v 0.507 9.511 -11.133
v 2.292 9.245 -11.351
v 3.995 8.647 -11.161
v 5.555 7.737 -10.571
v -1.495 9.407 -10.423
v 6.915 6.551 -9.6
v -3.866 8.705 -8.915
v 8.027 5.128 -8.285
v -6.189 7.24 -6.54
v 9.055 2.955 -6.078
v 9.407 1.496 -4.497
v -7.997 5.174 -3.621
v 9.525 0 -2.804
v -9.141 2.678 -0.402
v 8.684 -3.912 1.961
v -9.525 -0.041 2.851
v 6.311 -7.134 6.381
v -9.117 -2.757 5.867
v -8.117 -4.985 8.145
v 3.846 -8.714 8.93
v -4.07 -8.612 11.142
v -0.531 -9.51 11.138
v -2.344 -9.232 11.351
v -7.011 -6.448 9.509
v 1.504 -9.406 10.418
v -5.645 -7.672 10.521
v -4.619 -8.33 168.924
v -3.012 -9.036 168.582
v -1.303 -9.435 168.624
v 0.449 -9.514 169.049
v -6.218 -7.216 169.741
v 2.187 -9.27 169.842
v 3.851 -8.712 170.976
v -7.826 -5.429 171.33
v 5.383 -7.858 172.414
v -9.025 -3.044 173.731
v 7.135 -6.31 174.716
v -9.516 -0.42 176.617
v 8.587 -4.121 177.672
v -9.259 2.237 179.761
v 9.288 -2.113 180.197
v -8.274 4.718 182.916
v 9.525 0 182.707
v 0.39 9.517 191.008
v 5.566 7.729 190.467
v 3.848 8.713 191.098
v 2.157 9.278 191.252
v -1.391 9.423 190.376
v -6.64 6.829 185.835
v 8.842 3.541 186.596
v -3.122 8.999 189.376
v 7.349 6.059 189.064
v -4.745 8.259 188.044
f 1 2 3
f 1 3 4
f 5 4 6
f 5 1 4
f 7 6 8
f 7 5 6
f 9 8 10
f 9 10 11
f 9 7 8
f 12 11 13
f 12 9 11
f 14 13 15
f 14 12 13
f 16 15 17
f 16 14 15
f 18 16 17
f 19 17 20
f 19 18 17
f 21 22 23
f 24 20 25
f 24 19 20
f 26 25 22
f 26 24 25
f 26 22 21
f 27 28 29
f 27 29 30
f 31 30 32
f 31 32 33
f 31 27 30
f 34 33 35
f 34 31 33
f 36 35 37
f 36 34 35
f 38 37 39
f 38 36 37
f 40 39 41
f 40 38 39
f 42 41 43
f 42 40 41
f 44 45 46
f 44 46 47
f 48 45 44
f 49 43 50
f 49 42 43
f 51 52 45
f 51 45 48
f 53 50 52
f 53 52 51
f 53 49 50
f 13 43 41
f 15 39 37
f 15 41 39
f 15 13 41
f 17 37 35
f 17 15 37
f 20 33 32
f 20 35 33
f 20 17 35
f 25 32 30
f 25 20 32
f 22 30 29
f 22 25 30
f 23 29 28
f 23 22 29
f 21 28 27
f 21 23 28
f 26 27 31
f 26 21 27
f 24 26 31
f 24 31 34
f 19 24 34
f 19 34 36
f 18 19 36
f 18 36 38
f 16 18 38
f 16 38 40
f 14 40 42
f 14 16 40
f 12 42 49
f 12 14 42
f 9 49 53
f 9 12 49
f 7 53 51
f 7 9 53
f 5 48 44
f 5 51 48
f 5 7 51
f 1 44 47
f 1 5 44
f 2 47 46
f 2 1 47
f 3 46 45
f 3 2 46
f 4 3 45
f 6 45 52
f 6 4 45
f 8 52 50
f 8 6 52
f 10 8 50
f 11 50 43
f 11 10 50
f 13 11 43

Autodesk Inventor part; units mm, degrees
ref_plane "Start Plane" through (0, 0, -13.8034) normal (0, 0, 1) x (1, 0, 0)
ref_plane "End Plane" through (0, 0, 193.7064) normal (0, 0, 1) x (1, 0, 0)
sketch "Sketch" plane through (0, 0, 0) normal (0, 0, 1) x (1, 0, 0)
  circle A0 centre (0, 0) radius 9.525
  dimension "d0" = 19.05
extrude "Body" add sketch "Sketch" along normal up to surface (207.5098 mm away) from surface at -13.8034
sketch "Sketch2" plane through (0, 0, 0) normal (0, 0, 1) x (1, 0, 0)
  line L0 (0, 0) -> (10, 0)
ref_plane "Work Plane3" through (0, 0, 0) normal (0, -1, 0) x (1, 0, 0)
ref_plane "Work Plane4" through (2.3525, 9.2299, 191.2544) normal (-0.1892, -0.7423, 0.6428) x (0.9782, -0.0855, 0.1892)
split "Split1" plane through (2.3525, 9.2299, 191.2544) removes the side toward (-0.1892, -0.7423, 0.6428)
ref_plane "Work Plane5" through (2.3525, 9.2299, -11.3515) normal (-0.1892, -0.7423, -0.6428) x (0.8998, -0.3932, 0.1892)
split "Split2" plane through (2.3525, 9.2299, -11.3515) removes the side toward (-0.1892, -0.7423, -0.6428)
sketch "Sketch3" plane through (0, 0, 0) normal (0, -1, 0) x (1, 0, 0)
  line L0 (-2, -13.8034) -> (12, -13.8034) projected
  line L1 (-2, 193.7064) -> (12, 193.7064) projected
  dimension "d7" = 207.5098
equation "\"d0\" = Diam"
equation "\"d1\" = G_L"
equation "\"Diam\" = 19.05"
equation "\"G_L\" = 202.60588"
equation "\"G_OFFSET_START\" = 13.80341"
equation "\"G_OFFSET_END\" = 13.80341"
equation "\"d4\" = -G_OFFSET_START"
equation "\"d5\" = G_OFFSET_END + B_L"
equation "\"B_L\" = 179.90298"
properties part number "ANSI/AISC Rolled Steel - 3/4-7.977, RB" material "Steel, Mild"
